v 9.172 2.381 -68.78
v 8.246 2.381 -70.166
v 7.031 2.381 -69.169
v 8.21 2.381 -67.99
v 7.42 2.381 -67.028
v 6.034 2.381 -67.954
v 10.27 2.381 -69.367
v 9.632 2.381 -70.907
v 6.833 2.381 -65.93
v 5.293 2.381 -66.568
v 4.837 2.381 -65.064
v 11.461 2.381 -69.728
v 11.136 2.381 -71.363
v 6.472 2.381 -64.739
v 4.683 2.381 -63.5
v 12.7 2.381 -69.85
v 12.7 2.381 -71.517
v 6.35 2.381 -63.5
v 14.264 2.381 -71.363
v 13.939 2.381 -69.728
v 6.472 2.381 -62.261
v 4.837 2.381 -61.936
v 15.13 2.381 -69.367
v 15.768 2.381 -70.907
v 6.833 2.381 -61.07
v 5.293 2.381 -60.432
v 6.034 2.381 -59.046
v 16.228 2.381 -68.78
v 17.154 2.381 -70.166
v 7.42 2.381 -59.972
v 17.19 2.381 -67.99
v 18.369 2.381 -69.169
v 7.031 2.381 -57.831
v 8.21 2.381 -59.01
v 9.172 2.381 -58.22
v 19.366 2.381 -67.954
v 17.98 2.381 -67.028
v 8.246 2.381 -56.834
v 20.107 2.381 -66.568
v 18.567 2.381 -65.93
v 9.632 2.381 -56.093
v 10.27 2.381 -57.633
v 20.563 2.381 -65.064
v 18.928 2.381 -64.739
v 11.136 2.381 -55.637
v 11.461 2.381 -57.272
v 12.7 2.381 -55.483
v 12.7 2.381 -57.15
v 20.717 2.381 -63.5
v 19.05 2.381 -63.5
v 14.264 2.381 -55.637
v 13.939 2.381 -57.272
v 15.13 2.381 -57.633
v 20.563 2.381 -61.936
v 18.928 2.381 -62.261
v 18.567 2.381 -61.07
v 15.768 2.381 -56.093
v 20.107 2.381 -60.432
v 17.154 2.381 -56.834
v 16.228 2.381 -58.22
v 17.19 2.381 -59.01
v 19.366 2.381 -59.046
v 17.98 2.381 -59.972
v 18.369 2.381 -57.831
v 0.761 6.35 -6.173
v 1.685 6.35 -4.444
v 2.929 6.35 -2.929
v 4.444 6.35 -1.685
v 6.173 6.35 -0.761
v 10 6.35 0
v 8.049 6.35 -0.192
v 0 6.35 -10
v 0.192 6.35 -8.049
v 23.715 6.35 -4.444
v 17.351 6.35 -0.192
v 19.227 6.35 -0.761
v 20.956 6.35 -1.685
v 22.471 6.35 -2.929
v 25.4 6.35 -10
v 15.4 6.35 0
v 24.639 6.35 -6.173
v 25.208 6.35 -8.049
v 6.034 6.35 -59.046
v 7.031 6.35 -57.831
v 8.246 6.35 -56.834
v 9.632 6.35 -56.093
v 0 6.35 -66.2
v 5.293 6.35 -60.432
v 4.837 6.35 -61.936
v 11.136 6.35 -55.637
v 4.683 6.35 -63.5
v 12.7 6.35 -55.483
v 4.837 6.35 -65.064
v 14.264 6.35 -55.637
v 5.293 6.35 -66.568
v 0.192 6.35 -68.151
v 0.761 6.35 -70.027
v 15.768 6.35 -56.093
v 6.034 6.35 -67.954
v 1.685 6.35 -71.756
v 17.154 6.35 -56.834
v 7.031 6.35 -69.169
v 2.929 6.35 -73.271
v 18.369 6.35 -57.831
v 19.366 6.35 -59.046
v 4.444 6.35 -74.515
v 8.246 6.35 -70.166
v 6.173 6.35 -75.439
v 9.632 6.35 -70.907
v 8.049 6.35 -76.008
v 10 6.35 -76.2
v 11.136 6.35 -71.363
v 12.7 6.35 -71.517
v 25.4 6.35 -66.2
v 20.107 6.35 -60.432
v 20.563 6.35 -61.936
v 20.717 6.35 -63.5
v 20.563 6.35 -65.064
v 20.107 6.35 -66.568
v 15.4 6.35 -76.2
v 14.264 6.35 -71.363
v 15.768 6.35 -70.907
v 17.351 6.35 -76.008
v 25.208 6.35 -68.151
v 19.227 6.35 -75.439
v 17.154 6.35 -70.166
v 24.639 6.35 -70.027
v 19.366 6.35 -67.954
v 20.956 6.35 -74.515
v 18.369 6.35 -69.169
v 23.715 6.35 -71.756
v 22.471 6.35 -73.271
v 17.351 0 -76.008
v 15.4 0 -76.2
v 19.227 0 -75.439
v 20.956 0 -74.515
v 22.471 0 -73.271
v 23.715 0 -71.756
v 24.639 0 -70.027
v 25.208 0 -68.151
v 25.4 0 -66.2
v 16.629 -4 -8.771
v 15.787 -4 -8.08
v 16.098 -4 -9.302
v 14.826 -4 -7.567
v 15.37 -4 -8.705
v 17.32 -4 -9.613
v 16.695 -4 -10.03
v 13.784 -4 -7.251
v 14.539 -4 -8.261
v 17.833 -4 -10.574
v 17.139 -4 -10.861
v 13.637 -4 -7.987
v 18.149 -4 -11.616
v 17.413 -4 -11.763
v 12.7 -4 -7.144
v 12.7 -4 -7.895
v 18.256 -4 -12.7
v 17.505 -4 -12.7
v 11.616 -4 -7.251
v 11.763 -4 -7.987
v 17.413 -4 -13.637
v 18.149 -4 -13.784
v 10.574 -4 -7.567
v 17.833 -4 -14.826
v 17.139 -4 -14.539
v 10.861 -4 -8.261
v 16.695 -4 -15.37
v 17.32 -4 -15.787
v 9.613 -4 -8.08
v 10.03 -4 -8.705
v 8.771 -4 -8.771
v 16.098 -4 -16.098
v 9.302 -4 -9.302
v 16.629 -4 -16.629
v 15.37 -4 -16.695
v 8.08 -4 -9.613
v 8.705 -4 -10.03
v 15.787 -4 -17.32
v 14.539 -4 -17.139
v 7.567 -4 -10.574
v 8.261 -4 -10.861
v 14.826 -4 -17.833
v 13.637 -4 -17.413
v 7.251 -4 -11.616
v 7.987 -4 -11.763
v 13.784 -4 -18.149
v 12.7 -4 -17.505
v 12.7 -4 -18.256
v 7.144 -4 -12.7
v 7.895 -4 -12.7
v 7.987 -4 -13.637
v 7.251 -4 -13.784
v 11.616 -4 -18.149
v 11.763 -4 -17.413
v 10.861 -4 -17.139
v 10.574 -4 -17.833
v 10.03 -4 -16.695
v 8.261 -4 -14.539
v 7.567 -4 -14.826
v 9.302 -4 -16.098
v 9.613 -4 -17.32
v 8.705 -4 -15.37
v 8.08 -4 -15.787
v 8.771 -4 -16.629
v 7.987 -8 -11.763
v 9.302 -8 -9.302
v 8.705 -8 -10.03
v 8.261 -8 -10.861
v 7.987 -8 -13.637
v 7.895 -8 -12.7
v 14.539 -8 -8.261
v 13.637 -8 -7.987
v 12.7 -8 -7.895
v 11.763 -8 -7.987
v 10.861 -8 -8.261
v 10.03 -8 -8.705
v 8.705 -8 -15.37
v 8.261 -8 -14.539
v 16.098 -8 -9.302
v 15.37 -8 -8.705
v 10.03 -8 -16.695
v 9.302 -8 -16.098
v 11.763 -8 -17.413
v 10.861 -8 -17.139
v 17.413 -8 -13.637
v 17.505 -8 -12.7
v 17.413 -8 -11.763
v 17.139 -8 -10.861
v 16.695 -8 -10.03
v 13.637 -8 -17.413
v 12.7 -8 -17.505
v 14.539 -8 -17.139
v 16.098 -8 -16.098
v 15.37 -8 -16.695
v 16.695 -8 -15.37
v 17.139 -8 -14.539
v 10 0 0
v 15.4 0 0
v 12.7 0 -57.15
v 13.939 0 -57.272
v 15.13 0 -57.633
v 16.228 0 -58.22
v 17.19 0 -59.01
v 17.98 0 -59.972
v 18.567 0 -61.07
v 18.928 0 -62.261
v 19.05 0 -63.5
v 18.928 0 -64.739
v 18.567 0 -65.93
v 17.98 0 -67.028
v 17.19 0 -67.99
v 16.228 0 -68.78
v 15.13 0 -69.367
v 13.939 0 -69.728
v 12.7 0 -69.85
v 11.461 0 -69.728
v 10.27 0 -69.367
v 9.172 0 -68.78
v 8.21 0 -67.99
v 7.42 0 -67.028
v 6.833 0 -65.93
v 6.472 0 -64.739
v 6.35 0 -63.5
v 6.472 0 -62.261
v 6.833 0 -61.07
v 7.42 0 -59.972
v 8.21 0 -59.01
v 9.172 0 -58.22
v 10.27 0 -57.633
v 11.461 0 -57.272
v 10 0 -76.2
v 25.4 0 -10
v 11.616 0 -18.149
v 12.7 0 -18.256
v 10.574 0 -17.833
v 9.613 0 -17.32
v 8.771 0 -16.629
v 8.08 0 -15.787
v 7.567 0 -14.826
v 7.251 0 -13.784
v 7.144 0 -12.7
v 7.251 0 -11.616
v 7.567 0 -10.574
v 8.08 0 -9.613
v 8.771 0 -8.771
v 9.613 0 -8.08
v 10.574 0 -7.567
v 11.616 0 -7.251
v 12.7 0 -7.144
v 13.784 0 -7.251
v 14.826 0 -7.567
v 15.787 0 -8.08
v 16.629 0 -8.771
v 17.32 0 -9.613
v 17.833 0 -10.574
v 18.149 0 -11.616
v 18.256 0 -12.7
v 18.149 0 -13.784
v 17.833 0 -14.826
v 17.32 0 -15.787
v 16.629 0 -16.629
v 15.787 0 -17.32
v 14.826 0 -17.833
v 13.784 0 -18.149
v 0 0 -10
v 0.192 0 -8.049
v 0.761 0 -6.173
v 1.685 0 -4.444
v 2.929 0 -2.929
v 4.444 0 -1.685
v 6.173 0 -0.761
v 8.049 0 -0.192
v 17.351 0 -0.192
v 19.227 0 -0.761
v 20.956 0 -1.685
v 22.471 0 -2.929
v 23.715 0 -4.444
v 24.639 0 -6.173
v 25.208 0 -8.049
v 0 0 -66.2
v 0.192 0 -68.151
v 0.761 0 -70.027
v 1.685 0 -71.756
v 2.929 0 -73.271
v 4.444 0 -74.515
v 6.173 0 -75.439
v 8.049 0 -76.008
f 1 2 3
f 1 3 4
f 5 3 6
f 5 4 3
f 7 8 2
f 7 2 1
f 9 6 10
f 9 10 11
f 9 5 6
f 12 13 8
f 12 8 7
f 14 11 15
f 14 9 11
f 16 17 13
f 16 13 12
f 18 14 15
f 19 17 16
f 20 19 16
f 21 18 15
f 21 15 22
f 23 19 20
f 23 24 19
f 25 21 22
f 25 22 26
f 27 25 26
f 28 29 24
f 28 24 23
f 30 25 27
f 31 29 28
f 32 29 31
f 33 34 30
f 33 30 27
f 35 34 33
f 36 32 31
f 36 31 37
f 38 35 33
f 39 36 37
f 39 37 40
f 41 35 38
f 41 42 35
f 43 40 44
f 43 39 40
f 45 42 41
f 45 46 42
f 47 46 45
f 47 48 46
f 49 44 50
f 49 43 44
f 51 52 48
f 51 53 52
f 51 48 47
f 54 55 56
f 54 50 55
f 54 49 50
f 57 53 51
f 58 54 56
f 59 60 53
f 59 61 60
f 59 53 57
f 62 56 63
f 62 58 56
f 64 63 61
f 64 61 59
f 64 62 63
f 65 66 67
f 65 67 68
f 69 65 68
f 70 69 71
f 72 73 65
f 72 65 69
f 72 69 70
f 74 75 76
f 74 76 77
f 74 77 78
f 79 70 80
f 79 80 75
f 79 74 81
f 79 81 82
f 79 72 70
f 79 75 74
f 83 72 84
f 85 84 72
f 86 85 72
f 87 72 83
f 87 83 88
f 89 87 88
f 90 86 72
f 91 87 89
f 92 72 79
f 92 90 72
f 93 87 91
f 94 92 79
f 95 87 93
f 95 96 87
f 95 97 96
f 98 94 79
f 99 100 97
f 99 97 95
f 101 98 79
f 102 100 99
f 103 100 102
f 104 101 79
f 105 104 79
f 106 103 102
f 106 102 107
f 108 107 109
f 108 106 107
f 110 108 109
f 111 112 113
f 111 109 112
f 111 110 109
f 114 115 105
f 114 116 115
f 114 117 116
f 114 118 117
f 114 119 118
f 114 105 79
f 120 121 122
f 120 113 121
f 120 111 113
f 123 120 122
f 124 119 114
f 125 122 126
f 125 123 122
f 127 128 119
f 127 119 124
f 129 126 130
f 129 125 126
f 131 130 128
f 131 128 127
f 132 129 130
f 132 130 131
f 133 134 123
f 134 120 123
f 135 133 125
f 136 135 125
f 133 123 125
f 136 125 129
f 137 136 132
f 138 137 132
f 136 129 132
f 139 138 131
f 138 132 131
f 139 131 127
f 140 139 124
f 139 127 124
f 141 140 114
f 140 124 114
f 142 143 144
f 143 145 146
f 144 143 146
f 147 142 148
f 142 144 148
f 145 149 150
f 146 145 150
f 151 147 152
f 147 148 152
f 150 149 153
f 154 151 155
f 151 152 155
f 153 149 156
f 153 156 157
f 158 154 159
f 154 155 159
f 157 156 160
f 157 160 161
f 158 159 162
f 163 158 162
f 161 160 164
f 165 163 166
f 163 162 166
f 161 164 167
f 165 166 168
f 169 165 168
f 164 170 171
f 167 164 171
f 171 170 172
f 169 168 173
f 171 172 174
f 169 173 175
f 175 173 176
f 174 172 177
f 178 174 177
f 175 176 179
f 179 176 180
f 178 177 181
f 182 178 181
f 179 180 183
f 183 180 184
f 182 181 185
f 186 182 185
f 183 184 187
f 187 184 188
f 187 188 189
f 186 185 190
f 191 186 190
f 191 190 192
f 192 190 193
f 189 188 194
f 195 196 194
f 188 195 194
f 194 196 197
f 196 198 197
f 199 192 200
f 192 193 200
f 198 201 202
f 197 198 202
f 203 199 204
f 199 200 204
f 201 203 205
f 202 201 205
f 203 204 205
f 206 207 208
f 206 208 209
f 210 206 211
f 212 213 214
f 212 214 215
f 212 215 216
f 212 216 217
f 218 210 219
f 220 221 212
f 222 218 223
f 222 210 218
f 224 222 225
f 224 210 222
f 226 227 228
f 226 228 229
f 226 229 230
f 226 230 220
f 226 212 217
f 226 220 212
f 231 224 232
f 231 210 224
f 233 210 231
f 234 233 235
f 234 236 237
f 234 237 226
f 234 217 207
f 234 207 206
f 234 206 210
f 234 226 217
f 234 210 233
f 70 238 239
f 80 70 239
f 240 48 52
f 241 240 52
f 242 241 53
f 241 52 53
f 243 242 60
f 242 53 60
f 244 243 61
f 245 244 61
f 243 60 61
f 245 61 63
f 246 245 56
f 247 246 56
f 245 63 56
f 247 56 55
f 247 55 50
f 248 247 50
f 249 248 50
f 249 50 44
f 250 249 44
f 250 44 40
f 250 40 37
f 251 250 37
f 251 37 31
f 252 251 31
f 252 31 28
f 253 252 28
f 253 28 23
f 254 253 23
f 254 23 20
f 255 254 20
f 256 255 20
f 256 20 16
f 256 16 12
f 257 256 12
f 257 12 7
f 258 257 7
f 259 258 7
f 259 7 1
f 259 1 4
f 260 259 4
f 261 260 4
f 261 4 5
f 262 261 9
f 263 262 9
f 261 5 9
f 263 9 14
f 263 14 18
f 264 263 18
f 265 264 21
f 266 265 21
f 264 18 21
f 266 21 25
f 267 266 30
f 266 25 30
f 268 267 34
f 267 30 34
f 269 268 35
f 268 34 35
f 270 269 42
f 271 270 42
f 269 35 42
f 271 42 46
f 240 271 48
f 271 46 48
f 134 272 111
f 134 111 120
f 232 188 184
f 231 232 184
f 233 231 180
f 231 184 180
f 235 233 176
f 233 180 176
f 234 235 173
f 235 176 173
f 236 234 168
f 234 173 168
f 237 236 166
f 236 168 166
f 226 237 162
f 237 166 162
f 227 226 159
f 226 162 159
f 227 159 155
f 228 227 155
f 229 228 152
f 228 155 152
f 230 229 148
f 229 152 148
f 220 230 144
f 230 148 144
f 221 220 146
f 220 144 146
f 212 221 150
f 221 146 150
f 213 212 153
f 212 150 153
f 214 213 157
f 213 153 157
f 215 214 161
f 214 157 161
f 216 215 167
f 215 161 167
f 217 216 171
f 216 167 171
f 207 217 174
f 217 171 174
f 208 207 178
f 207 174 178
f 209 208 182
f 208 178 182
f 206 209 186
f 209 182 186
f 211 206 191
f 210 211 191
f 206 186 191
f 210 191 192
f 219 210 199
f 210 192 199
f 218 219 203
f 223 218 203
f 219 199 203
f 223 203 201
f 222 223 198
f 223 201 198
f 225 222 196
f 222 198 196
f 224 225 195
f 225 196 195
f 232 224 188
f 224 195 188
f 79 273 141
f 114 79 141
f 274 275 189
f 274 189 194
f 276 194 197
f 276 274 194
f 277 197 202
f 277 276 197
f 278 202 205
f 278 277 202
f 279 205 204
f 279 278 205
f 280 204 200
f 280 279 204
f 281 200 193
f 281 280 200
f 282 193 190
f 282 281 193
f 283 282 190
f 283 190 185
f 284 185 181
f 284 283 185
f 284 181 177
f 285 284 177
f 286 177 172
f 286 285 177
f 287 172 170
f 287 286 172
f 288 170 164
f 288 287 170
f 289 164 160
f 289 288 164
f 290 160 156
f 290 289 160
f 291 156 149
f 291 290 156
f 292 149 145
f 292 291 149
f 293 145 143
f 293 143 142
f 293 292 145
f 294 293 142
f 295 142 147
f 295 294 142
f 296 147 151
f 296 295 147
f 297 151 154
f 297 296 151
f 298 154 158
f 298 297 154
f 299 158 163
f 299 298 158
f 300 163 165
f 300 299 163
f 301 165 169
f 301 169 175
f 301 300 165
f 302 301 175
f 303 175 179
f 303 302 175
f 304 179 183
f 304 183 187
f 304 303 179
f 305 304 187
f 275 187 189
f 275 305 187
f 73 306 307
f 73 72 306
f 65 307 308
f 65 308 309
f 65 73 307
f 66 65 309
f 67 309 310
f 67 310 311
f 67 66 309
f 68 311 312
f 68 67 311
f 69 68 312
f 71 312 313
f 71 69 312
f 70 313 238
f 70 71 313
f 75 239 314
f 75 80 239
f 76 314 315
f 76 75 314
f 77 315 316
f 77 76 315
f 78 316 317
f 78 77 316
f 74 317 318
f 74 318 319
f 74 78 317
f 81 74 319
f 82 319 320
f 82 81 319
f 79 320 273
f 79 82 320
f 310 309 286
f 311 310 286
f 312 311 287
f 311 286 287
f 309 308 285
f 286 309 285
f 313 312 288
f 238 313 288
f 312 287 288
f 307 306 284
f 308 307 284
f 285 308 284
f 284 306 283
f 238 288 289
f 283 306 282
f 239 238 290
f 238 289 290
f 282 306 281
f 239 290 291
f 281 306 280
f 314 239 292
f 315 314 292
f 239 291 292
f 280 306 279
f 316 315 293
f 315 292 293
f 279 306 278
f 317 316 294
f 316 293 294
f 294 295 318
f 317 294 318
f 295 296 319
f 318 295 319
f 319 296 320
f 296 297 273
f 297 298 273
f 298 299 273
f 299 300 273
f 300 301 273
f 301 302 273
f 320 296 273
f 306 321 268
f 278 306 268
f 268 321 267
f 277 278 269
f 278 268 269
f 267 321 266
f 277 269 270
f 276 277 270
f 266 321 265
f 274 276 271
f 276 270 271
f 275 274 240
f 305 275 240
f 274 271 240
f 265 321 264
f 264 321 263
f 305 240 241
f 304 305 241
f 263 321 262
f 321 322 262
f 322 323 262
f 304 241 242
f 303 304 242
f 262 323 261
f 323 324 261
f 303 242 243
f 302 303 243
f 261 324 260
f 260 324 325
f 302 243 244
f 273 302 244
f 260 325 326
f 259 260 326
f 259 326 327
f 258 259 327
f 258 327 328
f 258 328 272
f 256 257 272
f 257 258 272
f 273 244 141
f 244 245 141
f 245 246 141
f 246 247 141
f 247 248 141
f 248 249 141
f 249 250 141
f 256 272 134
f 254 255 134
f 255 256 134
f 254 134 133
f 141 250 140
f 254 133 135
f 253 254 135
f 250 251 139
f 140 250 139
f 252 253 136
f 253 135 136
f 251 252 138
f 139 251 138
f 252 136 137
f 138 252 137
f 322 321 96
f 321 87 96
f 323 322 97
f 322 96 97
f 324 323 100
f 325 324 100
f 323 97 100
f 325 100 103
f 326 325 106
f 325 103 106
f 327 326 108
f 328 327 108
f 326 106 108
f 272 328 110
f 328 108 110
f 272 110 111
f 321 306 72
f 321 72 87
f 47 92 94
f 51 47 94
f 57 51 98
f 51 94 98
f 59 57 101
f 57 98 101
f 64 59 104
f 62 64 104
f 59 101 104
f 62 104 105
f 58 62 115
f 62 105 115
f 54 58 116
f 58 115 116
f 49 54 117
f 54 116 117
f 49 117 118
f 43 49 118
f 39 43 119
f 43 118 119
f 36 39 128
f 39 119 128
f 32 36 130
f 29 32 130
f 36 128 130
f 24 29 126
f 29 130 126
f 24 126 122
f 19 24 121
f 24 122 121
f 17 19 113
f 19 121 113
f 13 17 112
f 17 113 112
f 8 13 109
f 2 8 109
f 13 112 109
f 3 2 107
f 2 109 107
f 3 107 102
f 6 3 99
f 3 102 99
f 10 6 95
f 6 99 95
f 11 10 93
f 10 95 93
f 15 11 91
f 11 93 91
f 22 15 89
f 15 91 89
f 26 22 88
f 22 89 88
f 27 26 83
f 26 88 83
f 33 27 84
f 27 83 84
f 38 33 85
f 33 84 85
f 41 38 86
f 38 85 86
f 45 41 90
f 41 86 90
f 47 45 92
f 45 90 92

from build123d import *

# Parameters (mm, degrees)
SKETCH1_W           = 25.4
SKETCH1_H           = 76.2
BOSS_EXTRUDE1_DEPTH = 6.35
SKETCH5_R           = 8.016875
CUT_EXTRUDE1_DEPTH  = 3.96875
SKETCH6_R           = 6.35
CUT_EXTRUDE2_DEPTH  = 81.419841933
BOSS_EXTRUDE2_START = -6.35
SKETCH7_R           = 5.55625
BOSS_EXTRUDE2_DEPTH = 4
SKETCH8_R           = 4.805
BOSS_EXTRUDE3_DEPTH = 4
FILLET1_R           = 10


with BuildPart() as part:
    # Sketch1 → Boss-Extrude1 (new body)
    with BuildSketch(Plane(origin=(0, 0, 0), x_dir=(1, 0, 0), z_dir=(0, 1, 0))):
        with Locations((12.7, 38.1)):
            Rectangle(SKETCH1_W, SKETCH1_H)
    extrude(amount=BOSS_EXTRUDE1_DEPTH)

    # Sketch5 → Cut-Extrude1 (cut)
    with BuildSketch(Plane(origin=(0, 6.35, 0), x_dir=(1, 0, 0), z_dir=(0, 1, 0))):
        with Locations(Location((12.7, 63.5, 0), (0, 0, 270))):
            Circle(SKETCH5_R)
    extrude(amount=-CUT_EXTRUDE1_DEPTH, mode=Mode.SUBTRACT)

    # Sketch6 → Cut-Extrude2 (cut, through all)
    with BuildSketch(Plane(origin=(0, 2.38125, 0), x_dir=(1, 0, 0), z_dir=(0, 1, 0))):
        with Locations(Location((12.7, 63.5, 0), (0, 0, 270))):
            Circle(SKETCH6_R)
    extrude(amount=-CUT_EXTRUDE2_DEPTH, mode=Mode.SUBTRACT)

    # Sketch7 → Boss-Extrude2 (add)
    with BuildSketch(Plane(origin=(0, 6.35, 0), x_dir=(1, 0, 0), z_dir=(0, 1, 0)).offset(BOSS_EXTRUDE2_START)):
        with Locations(Location((12.7, 12.7, 0), (0, 0, 90))):
            Circle(SKETCH7_R)
    extrude(amount=-BOSS_EXTRUDE2_DEPTH)

    # Sketch8 → Boss-Extrude3 (add)
    with BuildSketch(Plane.XZ.offset(4)):
        with Locations(Location((12.7, -12.7, 0), (0, 0, 270))):
            Circle(SKETCH8_R)
    extrude(amount=BOSS_EXTRUDE3_DEPTH)

    # Fillet1
    fillet1_edges = [part.edges().sort_by_distance(p)[0] for p in [
        (0, 3.175, -76.2),
        (25.4, 3.175, -76.2),
        (25.4, 3.175, 0),
        (0, 3.175, 0),
    ]]
    fillet(fillet1_edges, radius=FILLET1_R)


solid = part.part
